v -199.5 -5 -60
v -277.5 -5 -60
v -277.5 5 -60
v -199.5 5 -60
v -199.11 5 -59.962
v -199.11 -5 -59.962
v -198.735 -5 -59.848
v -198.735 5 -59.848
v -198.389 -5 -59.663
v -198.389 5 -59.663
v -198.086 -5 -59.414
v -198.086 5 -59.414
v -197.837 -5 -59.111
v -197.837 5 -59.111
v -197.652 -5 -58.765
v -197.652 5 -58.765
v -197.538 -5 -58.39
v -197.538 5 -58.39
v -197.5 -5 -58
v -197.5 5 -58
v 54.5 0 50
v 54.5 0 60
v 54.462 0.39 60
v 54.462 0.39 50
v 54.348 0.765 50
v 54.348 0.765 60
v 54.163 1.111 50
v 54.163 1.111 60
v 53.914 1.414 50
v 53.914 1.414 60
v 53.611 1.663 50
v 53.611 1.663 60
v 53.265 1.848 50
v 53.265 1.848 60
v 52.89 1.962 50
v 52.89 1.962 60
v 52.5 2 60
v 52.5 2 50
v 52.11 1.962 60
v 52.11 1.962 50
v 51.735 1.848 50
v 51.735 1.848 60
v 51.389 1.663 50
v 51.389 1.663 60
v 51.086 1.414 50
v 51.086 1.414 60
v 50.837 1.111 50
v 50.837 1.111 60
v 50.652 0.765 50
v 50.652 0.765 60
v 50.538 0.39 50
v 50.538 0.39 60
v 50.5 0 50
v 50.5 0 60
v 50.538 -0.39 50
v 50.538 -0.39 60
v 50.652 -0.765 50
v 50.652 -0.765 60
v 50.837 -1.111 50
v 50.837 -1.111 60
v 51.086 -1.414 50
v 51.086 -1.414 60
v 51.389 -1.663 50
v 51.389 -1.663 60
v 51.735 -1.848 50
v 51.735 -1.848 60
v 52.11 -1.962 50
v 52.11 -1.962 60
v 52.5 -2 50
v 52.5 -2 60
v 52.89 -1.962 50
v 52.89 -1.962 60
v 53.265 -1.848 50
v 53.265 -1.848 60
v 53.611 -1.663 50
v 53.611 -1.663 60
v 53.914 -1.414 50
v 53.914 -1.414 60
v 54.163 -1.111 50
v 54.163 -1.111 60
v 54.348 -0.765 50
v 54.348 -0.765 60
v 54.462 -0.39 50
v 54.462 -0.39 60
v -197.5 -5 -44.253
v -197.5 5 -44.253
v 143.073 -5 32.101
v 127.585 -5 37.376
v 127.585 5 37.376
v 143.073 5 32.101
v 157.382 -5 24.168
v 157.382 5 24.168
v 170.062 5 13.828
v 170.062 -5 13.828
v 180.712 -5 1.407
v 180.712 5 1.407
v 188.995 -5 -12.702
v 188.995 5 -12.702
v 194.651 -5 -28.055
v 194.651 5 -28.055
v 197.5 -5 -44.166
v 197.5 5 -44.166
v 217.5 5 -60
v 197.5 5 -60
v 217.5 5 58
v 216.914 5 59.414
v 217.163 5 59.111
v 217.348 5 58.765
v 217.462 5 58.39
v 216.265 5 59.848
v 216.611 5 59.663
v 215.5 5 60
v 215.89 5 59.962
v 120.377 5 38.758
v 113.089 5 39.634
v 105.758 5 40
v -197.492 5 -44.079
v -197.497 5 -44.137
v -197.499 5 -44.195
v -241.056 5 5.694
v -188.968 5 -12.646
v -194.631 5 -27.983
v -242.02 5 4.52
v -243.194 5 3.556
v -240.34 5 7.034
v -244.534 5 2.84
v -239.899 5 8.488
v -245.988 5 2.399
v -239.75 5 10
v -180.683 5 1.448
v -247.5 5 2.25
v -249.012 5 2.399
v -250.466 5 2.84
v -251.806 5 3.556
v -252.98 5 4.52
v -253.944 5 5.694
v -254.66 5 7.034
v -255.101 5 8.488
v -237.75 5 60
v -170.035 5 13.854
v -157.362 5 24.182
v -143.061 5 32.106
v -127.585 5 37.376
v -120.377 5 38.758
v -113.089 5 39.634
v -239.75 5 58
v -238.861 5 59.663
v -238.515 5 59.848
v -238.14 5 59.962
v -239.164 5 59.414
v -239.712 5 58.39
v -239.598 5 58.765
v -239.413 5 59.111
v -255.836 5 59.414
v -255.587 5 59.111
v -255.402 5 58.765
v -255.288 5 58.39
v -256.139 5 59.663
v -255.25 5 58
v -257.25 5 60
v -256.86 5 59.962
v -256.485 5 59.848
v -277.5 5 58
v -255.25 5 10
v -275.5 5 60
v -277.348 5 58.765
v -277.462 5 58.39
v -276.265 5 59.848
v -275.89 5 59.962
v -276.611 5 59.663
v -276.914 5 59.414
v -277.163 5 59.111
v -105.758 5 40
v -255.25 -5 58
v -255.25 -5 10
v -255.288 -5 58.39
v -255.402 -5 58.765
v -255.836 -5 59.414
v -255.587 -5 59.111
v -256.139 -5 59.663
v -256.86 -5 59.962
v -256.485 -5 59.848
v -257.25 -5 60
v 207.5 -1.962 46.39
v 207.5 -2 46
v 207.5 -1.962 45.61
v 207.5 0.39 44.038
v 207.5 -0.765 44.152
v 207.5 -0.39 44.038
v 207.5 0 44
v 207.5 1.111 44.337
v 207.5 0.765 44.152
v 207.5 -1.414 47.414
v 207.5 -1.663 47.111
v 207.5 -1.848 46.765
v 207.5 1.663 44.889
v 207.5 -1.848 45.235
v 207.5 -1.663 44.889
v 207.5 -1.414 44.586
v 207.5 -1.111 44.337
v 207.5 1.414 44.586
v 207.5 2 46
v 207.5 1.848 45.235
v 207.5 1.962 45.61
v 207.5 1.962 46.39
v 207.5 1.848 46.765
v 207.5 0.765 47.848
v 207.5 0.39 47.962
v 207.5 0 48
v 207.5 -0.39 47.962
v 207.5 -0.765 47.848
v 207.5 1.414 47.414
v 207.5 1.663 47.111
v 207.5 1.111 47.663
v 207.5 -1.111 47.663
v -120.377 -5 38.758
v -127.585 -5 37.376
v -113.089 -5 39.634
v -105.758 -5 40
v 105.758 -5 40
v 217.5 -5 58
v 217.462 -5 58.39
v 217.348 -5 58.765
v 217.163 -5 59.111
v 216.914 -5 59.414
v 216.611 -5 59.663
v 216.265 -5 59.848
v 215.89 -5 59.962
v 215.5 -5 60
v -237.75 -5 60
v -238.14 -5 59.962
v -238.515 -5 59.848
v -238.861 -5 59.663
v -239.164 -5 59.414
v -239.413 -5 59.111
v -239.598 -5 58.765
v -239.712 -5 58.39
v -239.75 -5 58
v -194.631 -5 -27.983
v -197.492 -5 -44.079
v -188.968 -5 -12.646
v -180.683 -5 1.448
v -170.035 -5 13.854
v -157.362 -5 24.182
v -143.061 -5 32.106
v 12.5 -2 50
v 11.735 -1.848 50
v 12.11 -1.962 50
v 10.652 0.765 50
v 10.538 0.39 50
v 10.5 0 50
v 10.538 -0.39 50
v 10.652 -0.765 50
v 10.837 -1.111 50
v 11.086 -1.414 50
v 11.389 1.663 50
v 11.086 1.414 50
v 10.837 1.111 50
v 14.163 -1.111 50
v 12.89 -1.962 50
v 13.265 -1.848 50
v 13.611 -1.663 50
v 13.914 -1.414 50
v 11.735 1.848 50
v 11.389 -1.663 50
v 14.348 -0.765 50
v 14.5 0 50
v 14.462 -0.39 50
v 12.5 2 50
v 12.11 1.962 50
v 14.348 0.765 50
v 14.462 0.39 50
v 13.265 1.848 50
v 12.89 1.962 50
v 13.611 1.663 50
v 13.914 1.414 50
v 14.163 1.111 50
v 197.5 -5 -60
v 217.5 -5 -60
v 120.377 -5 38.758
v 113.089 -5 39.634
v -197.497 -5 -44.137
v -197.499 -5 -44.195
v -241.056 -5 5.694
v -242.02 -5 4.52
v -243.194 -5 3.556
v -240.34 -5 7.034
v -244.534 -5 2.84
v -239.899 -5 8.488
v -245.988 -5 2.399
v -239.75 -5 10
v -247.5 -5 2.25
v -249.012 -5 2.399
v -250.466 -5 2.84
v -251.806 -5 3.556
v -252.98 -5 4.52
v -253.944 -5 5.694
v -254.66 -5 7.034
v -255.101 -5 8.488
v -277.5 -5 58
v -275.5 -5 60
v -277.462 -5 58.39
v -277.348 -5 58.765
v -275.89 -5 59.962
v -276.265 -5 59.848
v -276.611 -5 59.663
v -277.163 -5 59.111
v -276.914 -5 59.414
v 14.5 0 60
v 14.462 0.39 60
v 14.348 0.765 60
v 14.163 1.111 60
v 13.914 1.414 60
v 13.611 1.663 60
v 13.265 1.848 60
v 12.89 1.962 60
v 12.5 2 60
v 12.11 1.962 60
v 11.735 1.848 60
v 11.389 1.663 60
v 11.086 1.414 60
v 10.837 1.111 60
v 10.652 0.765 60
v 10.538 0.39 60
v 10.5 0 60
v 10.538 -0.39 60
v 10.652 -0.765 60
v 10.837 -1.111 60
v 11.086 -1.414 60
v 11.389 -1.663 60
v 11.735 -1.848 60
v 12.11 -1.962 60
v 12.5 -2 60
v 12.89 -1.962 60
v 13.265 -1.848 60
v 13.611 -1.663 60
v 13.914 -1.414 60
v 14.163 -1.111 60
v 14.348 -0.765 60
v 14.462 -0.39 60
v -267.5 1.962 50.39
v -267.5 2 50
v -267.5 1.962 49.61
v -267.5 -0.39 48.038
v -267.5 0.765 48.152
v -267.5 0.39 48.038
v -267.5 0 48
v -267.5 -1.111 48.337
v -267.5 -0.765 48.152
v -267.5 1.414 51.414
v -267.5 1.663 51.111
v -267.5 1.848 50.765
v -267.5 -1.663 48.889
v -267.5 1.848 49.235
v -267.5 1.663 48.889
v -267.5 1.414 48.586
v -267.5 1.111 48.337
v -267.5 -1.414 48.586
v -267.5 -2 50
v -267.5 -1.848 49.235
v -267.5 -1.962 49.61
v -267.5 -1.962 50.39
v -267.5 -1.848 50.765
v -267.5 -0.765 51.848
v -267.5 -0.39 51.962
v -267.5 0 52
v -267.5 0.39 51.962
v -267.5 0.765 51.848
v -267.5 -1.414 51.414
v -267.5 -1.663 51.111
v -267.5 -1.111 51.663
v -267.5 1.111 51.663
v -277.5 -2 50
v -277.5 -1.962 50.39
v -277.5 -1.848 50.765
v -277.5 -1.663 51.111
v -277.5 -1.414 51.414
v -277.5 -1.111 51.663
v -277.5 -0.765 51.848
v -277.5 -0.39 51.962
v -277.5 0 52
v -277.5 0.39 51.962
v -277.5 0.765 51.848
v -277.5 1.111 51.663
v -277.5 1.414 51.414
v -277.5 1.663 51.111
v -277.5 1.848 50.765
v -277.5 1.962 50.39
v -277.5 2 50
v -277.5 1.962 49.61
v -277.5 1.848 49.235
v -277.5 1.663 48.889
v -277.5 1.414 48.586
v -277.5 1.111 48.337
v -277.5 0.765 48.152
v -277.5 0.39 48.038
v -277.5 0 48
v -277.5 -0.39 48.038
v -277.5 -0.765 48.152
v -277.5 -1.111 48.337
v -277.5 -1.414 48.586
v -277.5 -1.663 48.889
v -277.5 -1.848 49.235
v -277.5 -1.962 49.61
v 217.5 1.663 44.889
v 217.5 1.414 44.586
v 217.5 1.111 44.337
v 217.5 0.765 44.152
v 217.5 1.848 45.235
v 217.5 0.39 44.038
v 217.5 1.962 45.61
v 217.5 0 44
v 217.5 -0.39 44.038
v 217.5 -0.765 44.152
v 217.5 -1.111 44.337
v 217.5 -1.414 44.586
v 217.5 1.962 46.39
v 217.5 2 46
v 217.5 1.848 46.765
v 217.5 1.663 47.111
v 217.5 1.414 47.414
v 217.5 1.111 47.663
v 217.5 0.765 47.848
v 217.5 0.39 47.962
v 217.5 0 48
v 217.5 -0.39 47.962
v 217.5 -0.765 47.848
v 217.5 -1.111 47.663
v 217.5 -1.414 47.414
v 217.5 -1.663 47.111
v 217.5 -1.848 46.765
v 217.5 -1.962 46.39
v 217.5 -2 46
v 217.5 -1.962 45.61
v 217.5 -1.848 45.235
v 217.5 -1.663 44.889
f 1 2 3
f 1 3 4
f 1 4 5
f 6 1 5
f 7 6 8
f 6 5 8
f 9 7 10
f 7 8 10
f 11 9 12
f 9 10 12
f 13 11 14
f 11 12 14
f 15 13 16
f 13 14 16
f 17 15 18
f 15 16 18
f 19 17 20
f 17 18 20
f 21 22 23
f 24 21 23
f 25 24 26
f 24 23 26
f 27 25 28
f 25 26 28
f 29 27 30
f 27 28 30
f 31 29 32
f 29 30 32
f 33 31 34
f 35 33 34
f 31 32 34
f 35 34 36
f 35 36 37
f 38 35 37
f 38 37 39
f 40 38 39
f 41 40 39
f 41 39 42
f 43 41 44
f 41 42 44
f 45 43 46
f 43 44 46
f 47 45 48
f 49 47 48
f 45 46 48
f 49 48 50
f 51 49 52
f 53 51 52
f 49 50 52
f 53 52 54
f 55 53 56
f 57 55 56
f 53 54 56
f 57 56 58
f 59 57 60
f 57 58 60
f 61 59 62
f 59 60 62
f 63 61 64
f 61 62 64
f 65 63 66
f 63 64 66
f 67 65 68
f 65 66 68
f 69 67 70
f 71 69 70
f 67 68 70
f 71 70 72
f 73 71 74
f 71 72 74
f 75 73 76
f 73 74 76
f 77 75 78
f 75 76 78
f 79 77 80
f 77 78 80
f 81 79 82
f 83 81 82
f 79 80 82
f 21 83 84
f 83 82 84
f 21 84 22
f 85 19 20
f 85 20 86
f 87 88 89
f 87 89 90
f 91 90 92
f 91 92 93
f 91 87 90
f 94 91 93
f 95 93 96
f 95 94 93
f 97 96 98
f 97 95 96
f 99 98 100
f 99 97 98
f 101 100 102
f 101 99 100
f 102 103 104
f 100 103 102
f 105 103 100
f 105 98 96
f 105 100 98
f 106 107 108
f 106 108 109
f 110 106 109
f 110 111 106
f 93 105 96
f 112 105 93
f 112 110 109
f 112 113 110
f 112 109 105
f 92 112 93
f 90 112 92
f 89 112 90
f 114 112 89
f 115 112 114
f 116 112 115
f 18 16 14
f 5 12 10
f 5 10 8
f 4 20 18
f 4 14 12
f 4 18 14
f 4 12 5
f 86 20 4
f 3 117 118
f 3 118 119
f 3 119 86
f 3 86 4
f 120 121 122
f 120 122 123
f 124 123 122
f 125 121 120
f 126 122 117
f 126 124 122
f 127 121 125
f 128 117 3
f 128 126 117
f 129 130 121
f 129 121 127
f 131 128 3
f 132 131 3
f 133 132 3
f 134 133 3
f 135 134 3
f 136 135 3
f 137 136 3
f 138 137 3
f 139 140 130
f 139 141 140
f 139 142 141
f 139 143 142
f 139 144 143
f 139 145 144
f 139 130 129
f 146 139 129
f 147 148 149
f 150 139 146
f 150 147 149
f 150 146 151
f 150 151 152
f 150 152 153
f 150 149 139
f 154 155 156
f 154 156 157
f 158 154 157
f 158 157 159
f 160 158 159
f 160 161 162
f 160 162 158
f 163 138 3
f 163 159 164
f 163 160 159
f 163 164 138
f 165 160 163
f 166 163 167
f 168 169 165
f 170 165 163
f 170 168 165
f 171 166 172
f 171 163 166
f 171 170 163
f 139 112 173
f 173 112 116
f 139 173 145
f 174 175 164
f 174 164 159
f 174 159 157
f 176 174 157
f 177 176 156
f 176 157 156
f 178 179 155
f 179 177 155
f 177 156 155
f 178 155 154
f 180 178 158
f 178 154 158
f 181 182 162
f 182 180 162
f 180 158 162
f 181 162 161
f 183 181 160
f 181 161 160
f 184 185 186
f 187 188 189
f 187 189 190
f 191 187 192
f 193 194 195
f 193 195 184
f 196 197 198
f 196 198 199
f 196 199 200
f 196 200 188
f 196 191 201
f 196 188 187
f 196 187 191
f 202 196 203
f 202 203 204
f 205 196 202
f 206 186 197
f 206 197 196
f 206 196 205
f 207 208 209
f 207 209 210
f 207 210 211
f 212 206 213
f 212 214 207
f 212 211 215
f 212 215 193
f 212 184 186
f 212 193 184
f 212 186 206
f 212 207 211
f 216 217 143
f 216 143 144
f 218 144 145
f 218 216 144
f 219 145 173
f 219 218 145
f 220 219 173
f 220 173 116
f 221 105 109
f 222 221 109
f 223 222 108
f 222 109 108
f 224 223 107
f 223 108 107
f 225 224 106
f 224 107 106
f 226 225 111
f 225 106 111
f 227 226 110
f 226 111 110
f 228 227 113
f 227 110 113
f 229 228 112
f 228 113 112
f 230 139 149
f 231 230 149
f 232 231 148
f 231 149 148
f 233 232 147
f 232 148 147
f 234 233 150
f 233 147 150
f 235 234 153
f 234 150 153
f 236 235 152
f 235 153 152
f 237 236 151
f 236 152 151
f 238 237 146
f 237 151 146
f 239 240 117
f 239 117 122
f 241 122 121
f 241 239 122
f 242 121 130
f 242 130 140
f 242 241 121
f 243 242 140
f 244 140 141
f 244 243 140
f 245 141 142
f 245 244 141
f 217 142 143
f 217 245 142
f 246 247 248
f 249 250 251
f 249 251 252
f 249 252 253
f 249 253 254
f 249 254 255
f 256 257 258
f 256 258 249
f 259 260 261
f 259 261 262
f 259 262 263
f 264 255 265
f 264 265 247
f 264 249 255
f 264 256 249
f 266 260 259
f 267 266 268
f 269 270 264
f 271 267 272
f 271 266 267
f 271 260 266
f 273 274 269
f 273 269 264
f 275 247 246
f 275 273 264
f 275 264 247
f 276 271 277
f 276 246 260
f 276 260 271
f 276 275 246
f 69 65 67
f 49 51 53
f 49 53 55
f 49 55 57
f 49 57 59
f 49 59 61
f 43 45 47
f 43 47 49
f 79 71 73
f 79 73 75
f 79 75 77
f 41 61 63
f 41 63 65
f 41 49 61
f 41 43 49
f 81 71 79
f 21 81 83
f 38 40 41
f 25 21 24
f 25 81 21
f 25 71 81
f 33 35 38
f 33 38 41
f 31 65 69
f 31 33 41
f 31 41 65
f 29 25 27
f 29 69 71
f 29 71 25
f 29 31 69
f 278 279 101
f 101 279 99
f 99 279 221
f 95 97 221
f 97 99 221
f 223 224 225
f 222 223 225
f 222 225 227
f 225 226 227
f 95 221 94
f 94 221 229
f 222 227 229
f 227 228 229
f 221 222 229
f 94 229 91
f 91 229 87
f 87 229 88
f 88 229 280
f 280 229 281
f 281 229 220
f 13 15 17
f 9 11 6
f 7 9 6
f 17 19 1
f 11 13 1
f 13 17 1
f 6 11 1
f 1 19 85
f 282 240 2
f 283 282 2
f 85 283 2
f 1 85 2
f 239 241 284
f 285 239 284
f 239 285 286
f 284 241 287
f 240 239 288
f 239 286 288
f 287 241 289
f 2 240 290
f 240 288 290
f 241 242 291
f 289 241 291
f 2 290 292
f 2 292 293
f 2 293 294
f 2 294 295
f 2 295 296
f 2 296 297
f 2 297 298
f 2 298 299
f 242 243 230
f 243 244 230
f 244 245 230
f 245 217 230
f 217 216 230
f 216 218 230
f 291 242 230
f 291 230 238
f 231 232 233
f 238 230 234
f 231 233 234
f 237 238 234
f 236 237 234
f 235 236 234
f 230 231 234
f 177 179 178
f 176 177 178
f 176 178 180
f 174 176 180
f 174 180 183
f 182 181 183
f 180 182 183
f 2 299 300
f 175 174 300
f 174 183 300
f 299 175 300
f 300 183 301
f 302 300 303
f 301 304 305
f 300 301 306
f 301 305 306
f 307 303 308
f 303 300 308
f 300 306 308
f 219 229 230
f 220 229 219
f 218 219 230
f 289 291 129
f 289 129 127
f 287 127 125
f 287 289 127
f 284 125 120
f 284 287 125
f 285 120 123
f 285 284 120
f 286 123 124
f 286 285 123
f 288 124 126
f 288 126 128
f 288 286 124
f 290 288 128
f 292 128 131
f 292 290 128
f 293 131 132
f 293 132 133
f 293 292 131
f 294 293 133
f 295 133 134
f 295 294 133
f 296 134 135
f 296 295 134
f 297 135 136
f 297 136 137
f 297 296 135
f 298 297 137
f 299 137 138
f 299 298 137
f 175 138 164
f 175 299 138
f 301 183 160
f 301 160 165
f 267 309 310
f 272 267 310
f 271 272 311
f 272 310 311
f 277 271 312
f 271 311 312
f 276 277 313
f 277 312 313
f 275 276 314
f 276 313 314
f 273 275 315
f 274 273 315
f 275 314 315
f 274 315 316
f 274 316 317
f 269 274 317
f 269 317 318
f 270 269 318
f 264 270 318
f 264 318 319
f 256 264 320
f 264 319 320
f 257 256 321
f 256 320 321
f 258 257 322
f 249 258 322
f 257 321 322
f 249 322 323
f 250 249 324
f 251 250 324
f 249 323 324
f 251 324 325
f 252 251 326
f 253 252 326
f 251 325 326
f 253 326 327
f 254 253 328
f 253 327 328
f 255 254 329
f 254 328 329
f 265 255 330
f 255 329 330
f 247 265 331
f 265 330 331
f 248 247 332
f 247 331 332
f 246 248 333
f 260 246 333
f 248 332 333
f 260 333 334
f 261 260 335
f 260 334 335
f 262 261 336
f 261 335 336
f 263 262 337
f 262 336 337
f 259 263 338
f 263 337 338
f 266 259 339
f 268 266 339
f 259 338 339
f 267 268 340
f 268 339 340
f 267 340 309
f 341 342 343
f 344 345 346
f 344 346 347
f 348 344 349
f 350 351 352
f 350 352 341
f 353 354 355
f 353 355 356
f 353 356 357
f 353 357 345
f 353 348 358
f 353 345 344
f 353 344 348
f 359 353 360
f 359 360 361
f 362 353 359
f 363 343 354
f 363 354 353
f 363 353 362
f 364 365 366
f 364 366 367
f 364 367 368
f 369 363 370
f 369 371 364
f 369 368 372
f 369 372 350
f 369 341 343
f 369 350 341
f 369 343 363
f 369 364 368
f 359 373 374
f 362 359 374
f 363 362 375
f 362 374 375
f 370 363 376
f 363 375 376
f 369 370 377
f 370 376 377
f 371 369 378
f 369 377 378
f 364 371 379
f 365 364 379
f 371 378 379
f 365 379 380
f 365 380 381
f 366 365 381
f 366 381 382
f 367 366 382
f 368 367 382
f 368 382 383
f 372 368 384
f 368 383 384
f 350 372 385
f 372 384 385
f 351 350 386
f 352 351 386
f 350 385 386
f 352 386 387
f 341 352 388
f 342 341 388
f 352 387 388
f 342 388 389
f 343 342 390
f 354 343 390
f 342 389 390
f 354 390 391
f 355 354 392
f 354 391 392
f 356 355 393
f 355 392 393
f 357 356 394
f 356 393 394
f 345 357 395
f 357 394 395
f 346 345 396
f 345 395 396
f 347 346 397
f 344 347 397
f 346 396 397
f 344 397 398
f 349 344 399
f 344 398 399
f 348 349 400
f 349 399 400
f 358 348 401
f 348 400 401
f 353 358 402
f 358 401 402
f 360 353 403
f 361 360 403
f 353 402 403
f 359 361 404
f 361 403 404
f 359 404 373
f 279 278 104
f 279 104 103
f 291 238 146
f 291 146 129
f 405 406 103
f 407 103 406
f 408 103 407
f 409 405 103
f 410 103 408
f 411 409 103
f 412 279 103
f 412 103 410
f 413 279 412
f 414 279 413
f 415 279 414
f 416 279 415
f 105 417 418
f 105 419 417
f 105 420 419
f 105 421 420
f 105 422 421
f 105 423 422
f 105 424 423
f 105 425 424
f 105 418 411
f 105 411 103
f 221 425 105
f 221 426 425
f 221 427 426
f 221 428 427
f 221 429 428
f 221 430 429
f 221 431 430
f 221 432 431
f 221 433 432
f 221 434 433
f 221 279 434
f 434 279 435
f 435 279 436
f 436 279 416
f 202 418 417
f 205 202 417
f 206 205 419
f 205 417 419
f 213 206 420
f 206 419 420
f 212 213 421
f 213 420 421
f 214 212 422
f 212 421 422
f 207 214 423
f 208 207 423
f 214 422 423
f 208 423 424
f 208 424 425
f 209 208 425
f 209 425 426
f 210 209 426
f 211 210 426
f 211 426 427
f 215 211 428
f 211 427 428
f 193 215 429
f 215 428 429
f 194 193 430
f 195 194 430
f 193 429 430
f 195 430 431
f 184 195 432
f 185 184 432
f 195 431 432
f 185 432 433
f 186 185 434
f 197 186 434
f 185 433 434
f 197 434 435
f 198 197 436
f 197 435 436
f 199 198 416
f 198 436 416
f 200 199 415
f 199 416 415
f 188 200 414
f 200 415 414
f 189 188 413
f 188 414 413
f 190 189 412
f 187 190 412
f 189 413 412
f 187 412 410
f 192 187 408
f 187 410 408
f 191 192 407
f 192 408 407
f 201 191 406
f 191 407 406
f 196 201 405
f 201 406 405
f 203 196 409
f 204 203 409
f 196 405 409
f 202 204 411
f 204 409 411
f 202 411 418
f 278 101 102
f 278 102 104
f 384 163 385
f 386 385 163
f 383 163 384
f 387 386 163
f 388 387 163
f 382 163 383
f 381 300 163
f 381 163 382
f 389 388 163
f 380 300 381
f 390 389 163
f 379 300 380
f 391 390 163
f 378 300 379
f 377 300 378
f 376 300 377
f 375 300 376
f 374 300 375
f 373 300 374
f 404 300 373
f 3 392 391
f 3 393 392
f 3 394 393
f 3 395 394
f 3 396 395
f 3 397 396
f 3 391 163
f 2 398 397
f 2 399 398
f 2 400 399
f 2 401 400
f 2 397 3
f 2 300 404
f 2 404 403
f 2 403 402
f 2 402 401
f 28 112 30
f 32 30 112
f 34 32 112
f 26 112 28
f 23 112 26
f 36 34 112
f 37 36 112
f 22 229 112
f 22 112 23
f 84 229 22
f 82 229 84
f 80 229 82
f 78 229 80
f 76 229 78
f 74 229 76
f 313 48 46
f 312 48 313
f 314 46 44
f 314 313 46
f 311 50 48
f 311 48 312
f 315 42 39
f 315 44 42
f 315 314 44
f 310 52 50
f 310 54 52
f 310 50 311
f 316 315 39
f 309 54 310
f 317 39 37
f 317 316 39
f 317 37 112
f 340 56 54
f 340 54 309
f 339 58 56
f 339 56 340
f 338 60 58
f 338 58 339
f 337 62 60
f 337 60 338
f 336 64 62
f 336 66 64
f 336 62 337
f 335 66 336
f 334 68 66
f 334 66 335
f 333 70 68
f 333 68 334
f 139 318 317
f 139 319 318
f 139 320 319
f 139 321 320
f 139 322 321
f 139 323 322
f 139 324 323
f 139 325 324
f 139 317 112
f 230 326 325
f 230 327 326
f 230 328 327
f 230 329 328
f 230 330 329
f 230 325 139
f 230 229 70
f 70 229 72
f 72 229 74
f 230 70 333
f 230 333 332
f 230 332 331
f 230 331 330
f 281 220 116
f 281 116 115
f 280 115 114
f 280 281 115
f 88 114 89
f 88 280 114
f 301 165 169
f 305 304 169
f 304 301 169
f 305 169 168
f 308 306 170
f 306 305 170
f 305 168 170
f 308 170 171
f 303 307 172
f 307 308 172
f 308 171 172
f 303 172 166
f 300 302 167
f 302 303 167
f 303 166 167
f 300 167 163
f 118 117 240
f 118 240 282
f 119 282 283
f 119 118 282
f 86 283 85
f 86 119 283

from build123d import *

# Parameters (mm, degrees)
F1_DEPTH    = 5
F2_T1_DEPTH = 10
F2_T3_DEPTH = 20
F4_R        = 2
F5_DEPTH    = 10
F6_R        = 2
F7_DEPTH    = 10
F8_R        = 2
F9_DEPTH    = 10


# Not quite as in the source:
# - a fillet or chamfer that OpenCascade refuses, or shapes differently, is made with other operations: its cross-section is extruded or revolved along the edge and cut away or added
# - two fillets or chamfers of one size are made in one step


with BuildPart() as f1:
    # F0 (on Front) → F1 (new body, symmetric)
    with BuildSketch(Plane.XZ):
        with BuildLine():
            Line((-277.5, 60), (-277.5, -60))
            Line((-277.5, -60), (-197.5, -60))
            Line((-197.5, -60), (-197.5, -44.1662961254))
            ThreePointArc((-197.5, -44.1662961254), (-175.6633710032, 7.8544741443), (-127.5852874265, 37.3755985301))
            ThreePointArc((-127.5852874265, 37.3755985301), (-116.7403394644, 39.2599448569), (-105.7578089833, 40))
            Line((-105.7578089833, 40), (105.7578089833, 40))
            ThreePointArc((105.7578089833, 40), (116.7403394644, 39.2599448569), (127.5852874265, 37.3755985301))
            ThreePointArc((127.5852874265, 37.3755985301), (175.6633710032, 7.8544741443), (197.5, -44.1662961254))
            Line((197.5, -44.1662961254), (197.5, -60))
            Line((197.5, -60), (217.5, -60))
            Line((217.5, -60), (217.5, 40))
            Line((217.5, 40), (217.5, 60))
            Line((217.5, 60), (-239.75, 60))
            Line((-239.75, 60), (-239.75, 10))
            ThreePointArc((-239.75, 10), (-247.5, 2.25), (-255.25, 10))
            Line((-255.25, 10), (-255.25, 60))
            Line((-255.25, 60), (-277.5, 60))
        make_face()
    extrude(amount=F1_DEPTH, both=True)

    # F2: fillet of radius 2 on 6 edges, made by hand

    # F2_s2 → F2_t1 (join)
    with BuildSketch(Plane.XZ.offset(-5)):
        with BuildLine():
            ThreePointArc((-197.4924301703, -44.0790595559), (-197.4981066464, -44.1658995935), (-197.5, -44.252904362))
            Line((-197.5, -44.252904362), (-197.5, -44.1662961254))
            ThreePointArc((-197.5, -44.1662961254), (-197.4962254546, -44.1226769409), (-197.4924301703, -44.0790595559))
        make_face()
    extrude(amount=F2_T1_DEPTH)

    # F2_s4 → F2_t3 (cut)
    with BuildSketch(Plane.XZ.offset(-10)):
        with BuildLine():
            ThreePointArc((-255.25, 58), (-255.8357864376, 59.4142135624), (-257.25, 60))
            Line((-257.25, 60), (-255.25, 60))
            Line((-255.25, 60), (-255.25, 58))
        make_face()
        with BuildLine():
            ThreePointArc((-275.5, 60), (-276.9142135624, 59.4142135624), (-277.5, 58))
            Line((-277.5, 58), (-277.5, 60))
            Line((-277.5, 60), (-275.5, 60))
        make_face()
        with BuildLine():
            ThreePointArc((-199.5, -60), (-198.0857864376, -59.4142135624), (-197.5, -58))
            Line((-197.5, -58), (-197.5, -60))
            Line((-197.5, -60), (-199.5, -60))
        make_face()
        with BuildLine():
            ThreePointArc((-237.75, 60), (-239.1642135624, 59.4142135624), (-239.75, 58))
            Line((-239.75, 58), (-239.75, 60))
            Line((-239.75, 60), (-237.75, 60))
        make_face()
        with BuildLine():
            ThreePointArc((217.5, 58), (216.9142135624, 59.4142135624), (215.5, 60))
            Line((215.5, 60), (217.5, 60))
            Line((217.5, 60), (217.5, 58))
        make_face()
    extrude(amount=F2_T3_DEPTH, mode=Mode.SUBTRACT)

    # F4 (on face) → F5 (cut)
    with BuildSketch(Plane.XY.offset(60)):
        with Locations((12.5, 0)):
            Circle(F4_R)
        with Locations((52.5, 0)):
            Circle(F4_R)
    extrude(amount=-F5_DEPTH, mode=Mode.SUBTRACT)

    # F6 (on face) → F7 (cut)
    with BuildSketch(Plane.YZ.offset(217.5)):
        with Locations((0, 46)):
            Circle(F6_R)
    extrude(amount=-F7_DEPTH, mode=Mode.SUBTRACT)

    # F8 (on face) → F9 (cut)
    with BuildSketch(Plane(origin=(-277.5, 0, 0), x_dir=(0, -1, 0), z_dir=(-1, 0, 0))):
        with Locations((0, 50)):
            Circle(F8_R)
    extrude(amount=-F9_DEPTH, mode=Mode.SUBTRACT)


solid = f1.part
